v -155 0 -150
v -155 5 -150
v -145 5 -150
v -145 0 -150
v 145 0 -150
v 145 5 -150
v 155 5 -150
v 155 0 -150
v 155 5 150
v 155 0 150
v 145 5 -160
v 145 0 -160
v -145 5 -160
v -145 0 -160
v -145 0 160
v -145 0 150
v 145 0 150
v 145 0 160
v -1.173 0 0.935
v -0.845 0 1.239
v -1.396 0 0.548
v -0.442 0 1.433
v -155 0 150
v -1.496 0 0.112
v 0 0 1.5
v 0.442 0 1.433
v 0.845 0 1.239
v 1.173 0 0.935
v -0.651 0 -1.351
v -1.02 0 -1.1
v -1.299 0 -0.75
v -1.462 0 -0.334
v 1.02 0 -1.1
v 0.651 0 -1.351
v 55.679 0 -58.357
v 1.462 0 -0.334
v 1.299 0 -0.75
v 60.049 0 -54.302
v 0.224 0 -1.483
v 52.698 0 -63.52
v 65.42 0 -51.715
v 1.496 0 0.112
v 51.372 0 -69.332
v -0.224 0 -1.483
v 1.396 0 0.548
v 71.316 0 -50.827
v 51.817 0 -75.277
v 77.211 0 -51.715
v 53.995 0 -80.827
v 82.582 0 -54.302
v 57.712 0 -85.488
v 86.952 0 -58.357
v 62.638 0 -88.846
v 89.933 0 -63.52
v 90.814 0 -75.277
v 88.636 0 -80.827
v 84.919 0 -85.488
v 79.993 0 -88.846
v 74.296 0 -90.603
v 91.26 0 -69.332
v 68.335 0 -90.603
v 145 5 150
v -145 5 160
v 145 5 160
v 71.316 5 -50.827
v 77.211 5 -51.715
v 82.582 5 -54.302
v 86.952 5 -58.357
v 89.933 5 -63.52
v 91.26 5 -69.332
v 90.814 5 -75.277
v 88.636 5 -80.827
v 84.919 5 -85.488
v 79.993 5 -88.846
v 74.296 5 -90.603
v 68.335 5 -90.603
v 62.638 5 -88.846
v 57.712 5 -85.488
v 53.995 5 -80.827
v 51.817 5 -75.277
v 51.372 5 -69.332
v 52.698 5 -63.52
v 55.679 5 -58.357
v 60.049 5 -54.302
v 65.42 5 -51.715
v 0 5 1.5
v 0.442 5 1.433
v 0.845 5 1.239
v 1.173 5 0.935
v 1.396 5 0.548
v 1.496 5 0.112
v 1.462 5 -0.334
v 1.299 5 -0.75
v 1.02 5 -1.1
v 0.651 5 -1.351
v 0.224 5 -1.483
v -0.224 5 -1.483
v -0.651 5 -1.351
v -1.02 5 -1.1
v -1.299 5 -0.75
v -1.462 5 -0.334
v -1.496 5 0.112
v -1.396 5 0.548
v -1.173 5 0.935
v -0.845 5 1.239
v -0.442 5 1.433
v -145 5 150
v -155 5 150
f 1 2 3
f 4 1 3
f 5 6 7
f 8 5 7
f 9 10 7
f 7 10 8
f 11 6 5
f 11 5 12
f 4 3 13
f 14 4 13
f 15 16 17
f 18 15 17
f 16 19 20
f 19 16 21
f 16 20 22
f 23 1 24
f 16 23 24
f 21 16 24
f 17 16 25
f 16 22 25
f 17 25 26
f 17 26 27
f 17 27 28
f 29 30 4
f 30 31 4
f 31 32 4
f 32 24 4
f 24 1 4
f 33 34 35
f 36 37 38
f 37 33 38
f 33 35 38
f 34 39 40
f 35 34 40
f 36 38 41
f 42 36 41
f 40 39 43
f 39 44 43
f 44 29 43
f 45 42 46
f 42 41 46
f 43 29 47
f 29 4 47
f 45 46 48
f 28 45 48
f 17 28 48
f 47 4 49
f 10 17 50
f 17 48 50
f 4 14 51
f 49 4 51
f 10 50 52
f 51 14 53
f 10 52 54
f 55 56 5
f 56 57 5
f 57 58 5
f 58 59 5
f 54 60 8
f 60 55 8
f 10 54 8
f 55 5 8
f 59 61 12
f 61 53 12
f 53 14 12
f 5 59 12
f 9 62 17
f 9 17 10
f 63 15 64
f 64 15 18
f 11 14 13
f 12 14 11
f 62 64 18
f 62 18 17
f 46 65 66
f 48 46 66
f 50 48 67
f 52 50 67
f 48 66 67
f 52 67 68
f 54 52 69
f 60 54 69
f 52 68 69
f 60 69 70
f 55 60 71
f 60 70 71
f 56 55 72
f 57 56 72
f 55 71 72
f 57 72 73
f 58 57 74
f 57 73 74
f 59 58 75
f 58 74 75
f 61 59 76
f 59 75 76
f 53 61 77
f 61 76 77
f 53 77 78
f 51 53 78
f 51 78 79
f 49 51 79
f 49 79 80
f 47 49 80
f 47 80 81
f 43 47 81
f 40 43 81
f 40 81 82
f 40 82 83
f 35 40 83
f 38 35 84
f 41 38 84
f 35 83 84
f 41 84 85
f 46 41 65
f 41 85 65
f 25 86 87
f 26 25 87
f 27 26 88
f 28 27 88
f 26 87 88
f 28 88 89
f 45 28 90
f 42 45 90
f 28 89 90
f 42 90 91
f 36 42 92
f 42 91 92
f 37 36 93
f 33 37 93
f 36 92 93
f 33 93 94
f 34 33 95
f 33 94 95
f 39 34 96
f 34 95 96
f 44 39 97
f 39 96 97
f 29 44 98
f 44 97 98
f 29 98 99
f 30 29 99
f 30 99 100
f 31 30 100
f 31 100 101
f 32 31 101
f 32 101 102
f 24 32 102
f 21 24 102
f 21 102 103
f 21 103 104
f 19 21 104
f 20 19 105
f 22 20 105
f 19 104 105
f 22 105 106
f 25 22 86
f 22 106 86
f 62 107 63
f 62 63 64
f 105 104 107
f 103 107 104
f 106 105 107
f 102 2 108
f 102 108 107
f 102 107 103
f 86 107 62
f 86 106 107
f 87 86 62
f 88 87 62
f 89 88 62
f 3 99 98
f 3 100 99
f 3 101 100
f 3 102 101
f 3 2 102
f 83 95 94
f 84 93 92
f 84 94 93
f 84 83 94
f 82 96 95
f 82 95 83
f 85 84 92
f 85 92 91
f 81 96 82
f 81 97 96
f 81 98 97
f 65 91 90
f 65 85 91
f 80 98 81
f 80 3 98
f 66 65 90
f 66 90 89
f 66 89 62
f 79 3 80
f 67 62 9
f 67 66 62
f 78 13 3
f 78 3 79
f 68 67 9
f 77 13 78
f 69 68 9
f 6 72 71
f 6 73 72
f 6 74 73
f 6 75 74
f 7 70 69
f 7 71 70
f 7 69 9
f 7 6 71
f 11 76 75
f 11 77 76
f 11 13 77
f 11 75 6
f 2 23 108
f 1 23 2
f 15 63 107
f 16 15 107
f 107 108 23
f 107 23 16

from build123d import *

# Parameters (mm, degrees)
SKETCH_1_W          = 310
SKETCH_1_H          = 320
EXTRUDE_1_DEPTH     = 5
SKETCH_4_R          = 1.5
SKETCH_4_R_2        = 20
SKETCH_4_W          = 10
SKETCH_4_H          = 10
CUT_EXTRUDE_2_DEPTH = 5


with BuildPart() as part:
    # 草图1 → 凸台-拉伸1 (new body)
    with BuildSketch(Plane(origin=(0, 0, 0), x_dir=(1, 0, 0), z_dir=(0, 1, 0))):
        Rectangle(SKETCH_1_W, SKETCH_1_H)
    extrude(amount=EXTRUDE_1_DEPTH)

    # 草图4 → 切除-拉伸2 (cut)
    with BuildSketch(Plane(origin=(0, 5, 0), x_dir=(1, 0, 0), z_dir=(0, 1, 0))):
        with Locations(Location((0, 0, 0), (0, 0, 270))):
            Circle(SKETCH_4_R)
        with Locations(Location((71.315589165, 70.826615801, 0), (0, 0, 270))):
            Circle(SKETCH_4_R_2)
        with Locations((-150, 155)):
            Rectangle(SKETCH_4_W, SKETCH_4_H)
        with Locations((-150, -155)):
            Rectangle(SKETCH_4_W, SKETCH_4_H)
        with Locations((150, -155)):
            Rectangle(SKETCH_4_W, SKETCH_4_H)
        with Locations((150, 155)):
            Rectangle(SKETCH_4_W, SKETCH_4_H)
    extrude(amount=-CUT_EXTRUDE_2_DEPTH, mode=Mode.SUBTRACT)


solid = part.part
